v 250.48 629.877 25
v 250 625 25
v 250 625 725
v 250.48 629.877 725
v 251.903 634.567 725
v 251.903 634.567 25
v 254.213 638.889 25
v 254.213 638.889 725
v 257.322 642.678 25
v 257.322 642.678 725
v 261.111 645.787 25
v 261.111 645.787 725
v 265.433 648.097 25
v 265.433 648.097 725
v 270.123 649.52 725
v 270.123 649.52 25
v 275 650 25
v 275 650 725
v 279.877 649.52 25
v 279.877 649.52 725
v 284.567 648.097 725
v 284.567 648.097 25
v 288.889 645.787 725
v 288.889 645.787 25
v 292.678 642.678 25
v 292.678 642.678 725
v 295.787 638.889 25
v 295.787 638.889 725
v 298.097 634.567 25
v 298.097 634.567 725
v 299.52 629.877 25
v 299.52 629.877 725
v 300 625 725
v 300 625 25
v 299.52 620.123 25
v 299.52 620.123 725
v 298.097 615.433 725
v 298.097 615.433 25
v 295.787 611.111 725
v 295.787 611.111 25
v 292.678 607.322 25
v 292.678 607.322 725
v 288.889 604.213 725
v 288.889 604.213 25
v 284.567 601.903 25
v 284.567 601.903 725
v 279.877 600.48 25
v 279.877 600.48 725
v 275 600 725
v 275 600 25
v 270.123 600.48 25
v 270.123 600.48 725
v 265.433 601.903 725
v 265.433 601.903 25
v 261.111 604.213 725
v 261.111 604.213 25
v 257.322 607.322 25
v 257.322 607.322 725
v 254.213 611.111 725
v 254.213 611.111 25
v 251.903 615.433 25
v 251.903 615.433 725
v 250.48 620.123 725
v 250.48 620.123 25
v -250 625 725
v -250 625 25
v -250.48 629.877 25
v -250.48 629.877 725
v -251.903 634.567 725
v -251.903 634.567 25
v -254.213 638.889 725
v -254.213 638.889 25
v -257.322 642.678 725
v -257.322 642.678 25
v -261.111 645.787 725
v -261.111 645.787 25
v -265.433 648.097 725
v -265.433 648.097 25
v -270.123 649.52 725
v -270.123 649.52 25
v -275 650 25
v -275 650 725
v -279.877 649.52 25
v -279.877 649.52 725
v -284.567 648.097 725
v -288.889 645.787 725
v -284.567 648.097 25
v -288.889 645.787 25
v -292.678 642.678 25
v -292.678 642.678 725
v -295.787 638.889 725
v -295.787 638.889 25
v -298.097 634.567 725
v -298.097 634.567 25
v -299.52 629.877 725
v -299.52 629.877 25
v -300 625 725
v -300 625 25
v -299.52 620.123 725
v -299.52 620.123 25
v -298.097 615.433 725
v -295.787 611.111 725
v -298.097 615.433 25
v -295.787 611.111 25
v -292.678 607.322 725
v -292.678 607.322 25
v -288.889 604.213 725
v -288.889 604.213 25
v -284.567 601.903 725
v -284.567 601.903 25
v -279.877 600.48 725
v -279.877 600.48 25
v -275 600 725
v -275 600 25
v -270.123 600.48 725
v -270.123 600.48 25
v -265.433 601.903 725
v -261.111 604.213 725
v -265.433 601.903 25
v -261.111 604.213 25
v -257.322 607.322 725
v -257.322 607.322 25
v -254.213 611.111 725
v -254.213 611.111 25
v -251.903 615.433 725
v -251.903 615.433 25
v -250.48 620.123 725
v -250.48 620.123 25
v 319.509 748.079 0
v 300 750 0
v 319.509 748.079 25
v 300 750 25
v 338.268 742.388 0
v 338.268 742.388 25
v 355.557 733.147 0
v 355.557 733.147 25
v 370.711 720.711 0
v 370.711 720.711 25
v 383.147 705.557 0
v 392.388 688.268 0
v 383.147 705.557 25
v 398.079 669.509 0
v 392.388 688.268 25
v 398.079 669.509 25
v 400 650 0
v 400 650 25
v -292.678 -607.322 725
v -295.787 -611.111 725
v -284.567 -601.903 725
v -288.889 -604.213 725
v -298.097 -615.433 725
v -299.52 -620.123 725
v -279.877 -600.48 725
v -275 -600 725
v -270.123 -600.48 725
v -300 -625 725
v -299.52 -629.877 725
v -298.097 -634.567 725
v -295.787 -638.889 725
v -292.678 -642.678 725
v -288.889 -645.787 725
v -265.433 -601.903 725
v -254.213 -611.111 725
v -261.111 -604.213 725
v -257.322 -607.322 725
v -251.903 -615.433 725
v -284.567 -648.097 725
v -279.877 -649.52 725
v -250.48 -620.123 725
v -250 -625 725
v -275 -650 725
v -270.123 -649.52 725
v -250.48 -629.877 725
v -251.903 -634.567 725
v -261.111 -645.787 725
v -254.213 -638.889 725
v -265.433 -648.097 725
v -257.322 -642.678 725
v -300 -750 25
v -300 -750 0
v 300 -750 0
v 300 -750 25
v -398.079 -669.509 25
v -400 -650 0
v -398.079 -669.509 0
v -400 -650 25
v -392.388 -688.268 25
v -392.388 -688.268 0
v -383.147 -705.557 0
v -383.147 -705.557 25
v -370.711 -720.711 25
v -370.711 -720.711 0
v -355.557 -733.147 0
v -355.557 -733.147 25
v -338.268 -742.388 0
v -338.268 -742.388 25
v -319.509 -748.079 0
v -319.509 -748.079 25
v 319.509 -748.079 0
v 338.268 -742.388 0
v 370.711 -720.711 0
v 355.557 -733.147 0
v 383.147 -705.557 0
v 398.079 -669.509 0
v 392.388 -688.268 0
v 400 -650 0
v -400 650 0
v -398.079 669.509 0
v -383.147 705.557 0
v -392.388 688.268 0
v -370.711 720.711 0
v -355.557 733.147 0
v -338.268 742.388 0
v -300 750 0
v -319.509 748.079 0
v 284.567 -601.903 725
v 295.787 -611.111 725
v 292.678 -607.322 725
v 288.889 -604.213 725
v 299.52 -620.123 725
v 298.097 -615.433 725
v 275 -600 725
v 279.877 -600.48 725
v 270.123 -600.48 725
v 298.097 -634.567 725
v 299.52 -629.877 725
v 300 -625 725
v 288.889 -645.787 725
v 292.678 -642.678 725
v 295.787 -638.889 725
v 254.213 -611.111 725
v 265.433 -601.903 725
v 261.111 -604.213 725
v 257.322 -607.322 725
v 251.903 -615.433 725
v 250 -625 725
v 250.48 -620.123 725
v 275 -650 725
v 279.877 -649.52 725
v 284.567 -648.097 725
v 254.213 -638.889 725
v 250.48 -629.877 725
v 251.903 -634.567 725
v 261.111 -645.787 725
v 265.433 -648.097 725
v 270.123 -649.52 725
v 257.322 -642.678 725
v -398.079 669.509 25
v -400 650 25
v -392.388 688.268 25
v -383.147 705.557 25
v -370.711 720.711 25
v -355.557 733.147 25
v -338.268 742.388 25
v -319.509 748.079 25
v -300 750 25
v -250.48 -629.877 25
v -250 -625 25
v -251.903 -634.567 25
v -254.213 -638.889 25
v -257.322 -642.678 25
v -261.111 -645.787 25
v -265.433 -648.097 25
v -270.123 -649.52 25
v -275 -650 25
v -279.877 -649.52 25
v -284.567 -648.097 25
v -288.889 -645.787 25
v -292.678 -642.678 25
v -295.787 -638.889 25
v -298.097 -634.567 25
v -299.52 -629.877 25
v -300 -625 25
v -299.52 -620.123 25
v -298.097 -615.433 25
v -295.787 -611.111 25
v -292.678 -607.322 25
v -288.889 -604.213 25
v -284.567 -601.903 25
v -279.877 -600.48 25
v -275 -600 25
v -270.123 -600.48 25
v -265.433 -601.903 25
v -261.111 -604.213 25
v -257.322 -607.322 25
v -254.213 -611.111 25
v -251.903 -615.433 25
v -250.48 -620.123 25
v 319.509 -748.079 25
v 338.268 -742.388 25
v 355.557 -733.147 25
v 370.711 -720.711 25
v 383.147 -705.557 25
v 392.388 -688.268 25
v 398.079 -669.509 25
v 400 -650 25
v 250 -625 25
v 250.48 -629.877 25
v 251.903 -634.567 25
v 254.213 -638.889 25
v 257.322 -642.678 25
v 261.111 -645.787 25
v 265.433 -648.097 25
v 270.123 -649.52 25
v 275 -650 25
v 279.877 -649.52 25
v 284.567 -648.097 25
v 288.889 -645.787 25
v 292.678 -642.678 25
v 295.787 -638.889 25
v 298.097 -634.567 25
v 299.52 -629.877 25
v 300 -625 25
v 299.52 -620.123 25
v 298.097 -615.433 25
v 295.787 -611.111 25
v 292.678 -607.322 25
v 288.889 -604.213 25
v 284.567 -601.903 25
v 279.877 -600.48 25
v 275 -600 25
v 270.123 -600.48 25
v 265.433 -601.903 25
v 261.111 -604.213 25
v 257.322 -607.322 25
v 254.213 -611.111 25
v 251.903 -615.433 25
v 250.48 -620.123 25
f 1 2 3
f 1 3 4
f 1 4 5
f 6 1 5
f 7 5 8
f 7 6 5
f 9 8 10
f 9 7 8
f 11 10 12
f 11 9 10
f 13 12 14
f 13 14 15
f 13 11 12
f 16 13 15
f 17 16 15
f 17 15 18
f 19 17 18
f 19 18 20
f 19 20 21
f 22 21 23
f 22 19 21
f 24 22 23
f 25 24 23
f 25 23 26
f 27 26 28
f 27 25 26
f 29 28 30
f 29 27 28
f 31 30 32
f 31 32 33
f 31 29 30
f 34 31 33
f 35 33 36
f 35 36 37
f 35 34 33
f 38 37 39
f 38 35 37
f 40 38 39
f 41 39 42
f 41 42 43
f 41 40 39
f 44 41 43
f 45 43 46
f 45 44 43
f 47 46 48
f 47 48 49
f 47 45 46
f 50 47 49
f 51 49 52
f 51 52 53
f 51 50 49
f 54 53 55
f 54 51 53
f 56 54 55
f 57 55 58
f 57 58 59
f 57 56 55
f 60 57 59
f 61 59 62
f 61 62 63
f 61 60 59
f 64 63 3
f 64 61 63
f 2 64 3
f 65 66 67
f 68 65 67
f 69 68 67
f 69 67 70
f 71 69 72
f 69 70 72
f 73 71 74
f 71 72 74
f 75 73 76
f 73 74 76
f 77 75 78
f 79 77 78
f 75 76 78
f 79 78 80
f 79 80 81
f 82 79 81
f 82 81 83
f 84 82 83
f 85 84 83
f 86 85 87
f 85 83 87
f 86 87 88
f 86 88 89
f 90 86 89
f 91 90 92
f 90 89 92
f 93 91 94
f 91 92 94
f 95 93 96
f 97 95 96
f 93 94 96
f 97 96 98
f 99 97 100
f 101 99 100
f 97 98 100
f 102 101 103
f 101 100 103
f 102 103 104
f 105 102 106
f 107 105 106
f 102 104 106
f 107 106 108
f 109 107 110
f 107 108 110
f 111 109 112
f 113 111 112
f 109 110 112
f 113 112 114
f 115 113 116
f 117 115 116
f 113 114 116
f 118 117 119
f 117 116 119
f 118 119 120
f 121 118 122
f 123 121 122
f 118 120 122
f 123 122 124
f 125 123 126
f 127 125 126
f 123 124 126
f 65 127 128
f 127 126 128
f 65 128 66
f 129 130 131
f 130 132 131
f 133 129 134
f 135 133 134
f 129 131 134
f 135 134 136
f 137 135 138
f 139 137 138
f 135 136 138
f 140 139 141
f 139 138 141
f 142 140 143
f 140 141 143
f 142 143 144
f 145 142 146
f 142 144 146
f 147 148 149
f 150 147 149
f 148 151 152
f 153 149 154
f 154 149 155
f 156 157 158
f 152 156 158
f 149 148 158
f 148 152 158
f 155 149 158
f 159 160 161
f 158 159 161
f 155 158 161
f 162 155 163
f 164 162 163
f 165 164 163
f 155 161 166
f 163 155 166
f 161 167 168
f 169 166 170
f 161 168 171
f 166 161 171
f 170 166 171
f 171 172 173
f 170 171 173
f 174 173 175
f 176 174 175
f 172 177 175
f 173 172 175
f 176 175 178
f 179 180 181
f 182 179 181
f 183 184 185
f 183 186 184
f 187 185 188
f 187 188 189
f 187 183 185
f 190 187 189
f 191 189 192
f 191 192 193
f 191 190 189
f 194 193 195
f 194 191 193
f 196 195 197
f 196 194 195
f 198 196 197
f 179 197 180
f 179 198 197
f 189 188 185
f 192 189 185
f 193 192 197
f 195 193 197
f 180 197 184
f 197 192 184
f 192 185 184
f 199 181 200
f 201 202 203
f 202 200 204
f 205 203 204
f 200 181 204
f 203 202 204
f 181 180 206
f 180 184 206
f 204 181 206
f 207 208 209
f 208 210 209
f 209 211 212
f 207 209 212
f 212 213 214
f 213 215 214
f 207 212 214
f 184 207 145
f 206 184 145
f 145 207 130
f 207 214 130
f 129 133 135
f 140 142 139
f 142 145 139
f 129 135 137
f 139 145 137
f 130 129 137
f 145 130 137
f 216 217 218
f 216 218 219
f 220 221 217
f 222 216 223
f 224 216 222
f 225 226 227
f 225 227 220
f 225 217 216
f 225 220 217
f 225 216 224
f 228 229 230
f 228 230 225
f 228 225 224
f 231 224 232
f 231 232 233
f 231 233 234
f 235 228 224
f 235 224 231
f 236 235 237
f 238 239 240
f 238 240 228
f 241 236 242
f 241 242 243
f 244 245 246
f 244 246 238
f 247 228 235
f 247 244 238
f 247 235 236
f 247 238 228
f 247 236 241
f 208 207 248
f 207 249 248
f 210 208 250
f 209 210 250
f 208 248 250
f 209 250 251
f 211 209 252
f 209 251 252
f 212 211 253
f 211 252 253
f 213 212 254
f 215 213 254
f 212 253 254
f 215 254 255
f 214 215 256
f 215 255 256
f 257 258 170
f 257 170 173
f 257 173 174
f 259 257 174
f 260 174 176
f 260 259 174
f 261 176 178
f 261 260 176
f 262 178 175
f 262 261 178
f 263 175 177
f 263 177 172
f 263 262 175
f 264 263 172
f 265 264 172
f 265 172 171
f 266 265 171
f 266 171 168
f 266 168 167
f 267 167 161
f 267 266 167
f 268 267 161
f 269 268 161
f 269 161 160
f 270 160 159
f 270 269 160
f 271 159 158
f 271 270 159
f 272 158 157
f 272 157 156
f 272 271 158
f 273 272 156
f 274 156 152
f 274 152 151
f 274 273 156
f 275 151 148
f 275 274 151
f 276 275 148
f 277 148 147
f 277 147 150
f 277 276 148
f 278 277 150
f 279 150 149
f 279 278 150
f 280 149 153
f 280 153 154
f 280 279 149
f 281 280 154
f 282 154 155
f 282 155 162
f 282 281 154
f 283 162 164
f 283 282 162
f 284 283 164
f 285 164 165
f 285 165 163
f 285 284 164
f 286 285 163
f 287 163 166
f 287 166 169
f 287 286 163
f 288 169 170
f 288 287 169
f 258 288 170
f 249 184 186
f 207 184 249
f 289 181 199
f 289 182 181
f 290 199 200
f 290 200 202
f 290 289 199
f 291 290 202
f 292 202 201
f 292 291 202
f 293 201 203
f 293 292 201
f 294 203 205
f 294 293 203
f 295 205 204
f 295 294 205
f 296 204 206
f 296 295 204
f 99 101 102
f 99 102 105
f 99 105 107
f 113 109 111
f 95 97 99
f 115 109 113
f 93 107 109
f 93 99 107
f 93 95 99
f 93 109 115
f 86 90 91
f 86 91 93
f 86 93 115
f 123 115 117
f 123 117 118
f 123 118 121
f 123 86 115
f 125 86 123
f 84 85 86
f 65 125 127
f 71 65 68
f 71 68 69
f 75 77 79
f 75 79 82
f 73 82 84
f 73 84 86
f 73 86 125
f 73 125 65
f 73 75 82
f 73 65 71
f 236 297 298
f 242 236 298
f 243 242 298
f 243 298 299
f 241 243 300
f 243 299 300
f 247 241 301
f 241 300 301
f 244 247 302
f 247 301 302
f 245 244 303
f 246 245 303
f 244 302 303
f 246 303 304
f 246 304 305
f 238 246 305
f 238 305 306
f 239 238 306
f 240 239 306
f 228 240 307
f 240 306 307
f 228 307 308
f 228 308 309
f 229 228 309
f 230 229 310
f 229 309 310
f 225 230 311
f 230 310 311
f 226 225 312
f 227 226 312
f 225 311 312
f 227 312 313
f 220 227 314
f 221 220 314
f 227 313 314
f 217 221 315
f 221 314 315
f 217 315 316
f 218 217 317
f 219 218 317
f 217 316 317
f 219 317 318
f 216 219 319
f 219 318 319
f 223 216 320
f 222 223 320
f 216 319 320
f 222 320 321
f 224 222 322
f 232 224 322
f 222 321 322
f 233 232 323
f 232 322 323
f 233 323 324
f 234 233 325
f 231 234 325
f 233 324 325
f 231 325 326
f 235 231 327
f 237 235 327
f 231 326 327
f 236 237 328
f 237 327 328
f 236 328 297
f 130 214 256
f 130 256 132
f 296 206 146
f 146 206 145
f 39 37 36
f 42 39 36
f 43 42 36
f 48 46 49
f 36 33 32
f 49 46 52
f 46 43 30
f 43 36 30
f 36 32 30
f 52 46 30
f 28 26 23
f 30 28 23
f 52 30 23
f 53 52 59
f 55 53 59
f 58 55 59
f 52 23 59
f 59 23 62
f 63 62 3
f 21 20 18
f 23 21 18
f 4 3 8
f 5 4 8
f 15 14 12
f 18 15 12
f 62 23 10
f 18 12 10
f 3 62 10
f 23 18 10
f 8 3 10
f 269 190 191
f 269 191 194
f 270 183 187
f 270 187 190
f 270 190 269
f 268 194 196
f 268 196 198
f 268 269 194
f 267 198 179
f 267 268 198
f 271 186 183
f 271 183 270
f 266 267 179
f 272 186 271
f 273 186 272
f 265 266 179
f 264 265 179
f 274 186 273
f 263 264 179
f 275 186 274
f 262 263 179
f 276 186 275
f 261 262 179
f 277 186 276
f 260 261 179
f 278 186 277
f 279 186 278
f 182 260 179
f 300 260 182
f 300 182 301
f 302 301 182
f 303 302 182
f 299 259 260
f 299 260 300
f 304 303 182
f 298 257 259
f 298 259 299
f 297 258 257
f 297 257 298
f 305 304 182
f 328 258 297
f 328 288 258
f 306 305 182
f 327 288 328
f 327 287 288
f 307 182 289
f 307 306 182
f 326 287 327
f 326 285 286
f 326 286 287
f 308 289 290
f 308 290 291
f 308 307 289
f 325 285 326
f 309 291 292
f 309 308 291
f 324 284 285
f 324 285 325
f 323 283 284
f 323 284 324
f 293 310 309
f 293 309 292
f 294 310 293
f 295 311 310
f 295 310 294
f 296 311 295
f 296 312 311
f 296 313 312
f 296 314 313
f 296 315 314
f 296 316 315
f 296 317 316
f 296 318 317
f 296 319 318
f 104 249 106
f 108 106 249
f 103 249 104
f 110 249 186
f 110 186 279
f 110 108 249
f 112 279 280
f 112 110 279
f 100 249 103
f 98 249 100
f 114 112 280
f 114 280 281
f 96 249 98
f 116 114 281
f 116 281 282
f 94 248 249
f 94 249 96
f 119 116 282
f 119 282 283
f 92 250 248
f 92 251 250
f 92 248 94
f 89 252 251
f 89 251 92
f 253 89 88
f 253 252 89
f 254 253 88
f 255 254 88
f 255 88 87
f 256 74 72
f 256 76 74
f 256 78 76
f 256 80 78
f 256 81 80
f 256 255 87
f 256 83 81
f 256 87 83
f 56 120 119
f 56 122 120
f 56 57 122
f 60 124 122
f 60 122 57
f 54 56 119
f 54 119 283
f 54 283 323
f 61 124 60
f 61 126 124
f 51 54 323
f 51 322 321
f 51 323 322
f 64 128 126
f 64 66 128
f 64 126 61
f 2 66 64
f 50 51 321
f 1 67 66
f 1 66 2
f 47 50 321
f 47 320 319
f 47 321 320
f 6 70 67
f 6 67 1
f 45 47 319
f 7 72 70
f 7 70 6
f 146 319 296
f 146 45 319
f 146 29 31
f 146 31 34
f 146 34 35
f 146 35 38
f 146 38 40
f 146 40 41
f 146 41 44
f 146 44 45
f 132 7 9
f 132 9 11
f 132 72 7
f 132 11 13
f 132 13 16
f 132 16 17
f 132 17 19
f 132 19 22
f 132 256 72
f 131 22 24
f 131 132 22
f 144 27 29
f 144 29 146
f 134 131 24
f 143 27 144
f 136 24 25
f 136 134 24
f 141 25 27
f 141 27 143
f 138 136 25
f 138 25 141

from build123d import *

# Parameters (mm, degrees)
F0_W     = 800
F0_H     = 1500
F1_DEPTH = 25
F2_R     = 25
F3_DEPTH = 700
F6_R     = 100


with BuildPart() as f1:
    # F0 (on Top) → F1 (new body)
    with BuildSketch(Plane.XY):
        Rectangle(F0_W, F0_H)
    extrude(amount=F1_DEPTH)

    # F2 (on face) → F3 (join)
    with BuildSketch(Plane.XY.offset(25)):
        with Locations((-275, 625)):
            Circle(F2_R)
    extrude(amount=F3_DEPTH)

    # F4: F1 across plane


with BuildPart() as f1_1:
    add(f1.part)
    add(f1.part.mirror(Plane.XZ))

    # F5: F1 across plane


with BuildPart() as f1_2:
    add(f1_1.part)
    add(f1_1.part.mirror(Plane.YZ))

    # F6
    f6_edges = [f1_2.edges().sort_by_distance(p)[0] for p in [
        (-400, 750, 12.5),
        (400, 750, 12.5),
        (400, -750, 12.5),
        (-400, -750, 12.5),
    ]]
    fillet(f6_edges, radius=F6_R)


solid = f1_2.part
